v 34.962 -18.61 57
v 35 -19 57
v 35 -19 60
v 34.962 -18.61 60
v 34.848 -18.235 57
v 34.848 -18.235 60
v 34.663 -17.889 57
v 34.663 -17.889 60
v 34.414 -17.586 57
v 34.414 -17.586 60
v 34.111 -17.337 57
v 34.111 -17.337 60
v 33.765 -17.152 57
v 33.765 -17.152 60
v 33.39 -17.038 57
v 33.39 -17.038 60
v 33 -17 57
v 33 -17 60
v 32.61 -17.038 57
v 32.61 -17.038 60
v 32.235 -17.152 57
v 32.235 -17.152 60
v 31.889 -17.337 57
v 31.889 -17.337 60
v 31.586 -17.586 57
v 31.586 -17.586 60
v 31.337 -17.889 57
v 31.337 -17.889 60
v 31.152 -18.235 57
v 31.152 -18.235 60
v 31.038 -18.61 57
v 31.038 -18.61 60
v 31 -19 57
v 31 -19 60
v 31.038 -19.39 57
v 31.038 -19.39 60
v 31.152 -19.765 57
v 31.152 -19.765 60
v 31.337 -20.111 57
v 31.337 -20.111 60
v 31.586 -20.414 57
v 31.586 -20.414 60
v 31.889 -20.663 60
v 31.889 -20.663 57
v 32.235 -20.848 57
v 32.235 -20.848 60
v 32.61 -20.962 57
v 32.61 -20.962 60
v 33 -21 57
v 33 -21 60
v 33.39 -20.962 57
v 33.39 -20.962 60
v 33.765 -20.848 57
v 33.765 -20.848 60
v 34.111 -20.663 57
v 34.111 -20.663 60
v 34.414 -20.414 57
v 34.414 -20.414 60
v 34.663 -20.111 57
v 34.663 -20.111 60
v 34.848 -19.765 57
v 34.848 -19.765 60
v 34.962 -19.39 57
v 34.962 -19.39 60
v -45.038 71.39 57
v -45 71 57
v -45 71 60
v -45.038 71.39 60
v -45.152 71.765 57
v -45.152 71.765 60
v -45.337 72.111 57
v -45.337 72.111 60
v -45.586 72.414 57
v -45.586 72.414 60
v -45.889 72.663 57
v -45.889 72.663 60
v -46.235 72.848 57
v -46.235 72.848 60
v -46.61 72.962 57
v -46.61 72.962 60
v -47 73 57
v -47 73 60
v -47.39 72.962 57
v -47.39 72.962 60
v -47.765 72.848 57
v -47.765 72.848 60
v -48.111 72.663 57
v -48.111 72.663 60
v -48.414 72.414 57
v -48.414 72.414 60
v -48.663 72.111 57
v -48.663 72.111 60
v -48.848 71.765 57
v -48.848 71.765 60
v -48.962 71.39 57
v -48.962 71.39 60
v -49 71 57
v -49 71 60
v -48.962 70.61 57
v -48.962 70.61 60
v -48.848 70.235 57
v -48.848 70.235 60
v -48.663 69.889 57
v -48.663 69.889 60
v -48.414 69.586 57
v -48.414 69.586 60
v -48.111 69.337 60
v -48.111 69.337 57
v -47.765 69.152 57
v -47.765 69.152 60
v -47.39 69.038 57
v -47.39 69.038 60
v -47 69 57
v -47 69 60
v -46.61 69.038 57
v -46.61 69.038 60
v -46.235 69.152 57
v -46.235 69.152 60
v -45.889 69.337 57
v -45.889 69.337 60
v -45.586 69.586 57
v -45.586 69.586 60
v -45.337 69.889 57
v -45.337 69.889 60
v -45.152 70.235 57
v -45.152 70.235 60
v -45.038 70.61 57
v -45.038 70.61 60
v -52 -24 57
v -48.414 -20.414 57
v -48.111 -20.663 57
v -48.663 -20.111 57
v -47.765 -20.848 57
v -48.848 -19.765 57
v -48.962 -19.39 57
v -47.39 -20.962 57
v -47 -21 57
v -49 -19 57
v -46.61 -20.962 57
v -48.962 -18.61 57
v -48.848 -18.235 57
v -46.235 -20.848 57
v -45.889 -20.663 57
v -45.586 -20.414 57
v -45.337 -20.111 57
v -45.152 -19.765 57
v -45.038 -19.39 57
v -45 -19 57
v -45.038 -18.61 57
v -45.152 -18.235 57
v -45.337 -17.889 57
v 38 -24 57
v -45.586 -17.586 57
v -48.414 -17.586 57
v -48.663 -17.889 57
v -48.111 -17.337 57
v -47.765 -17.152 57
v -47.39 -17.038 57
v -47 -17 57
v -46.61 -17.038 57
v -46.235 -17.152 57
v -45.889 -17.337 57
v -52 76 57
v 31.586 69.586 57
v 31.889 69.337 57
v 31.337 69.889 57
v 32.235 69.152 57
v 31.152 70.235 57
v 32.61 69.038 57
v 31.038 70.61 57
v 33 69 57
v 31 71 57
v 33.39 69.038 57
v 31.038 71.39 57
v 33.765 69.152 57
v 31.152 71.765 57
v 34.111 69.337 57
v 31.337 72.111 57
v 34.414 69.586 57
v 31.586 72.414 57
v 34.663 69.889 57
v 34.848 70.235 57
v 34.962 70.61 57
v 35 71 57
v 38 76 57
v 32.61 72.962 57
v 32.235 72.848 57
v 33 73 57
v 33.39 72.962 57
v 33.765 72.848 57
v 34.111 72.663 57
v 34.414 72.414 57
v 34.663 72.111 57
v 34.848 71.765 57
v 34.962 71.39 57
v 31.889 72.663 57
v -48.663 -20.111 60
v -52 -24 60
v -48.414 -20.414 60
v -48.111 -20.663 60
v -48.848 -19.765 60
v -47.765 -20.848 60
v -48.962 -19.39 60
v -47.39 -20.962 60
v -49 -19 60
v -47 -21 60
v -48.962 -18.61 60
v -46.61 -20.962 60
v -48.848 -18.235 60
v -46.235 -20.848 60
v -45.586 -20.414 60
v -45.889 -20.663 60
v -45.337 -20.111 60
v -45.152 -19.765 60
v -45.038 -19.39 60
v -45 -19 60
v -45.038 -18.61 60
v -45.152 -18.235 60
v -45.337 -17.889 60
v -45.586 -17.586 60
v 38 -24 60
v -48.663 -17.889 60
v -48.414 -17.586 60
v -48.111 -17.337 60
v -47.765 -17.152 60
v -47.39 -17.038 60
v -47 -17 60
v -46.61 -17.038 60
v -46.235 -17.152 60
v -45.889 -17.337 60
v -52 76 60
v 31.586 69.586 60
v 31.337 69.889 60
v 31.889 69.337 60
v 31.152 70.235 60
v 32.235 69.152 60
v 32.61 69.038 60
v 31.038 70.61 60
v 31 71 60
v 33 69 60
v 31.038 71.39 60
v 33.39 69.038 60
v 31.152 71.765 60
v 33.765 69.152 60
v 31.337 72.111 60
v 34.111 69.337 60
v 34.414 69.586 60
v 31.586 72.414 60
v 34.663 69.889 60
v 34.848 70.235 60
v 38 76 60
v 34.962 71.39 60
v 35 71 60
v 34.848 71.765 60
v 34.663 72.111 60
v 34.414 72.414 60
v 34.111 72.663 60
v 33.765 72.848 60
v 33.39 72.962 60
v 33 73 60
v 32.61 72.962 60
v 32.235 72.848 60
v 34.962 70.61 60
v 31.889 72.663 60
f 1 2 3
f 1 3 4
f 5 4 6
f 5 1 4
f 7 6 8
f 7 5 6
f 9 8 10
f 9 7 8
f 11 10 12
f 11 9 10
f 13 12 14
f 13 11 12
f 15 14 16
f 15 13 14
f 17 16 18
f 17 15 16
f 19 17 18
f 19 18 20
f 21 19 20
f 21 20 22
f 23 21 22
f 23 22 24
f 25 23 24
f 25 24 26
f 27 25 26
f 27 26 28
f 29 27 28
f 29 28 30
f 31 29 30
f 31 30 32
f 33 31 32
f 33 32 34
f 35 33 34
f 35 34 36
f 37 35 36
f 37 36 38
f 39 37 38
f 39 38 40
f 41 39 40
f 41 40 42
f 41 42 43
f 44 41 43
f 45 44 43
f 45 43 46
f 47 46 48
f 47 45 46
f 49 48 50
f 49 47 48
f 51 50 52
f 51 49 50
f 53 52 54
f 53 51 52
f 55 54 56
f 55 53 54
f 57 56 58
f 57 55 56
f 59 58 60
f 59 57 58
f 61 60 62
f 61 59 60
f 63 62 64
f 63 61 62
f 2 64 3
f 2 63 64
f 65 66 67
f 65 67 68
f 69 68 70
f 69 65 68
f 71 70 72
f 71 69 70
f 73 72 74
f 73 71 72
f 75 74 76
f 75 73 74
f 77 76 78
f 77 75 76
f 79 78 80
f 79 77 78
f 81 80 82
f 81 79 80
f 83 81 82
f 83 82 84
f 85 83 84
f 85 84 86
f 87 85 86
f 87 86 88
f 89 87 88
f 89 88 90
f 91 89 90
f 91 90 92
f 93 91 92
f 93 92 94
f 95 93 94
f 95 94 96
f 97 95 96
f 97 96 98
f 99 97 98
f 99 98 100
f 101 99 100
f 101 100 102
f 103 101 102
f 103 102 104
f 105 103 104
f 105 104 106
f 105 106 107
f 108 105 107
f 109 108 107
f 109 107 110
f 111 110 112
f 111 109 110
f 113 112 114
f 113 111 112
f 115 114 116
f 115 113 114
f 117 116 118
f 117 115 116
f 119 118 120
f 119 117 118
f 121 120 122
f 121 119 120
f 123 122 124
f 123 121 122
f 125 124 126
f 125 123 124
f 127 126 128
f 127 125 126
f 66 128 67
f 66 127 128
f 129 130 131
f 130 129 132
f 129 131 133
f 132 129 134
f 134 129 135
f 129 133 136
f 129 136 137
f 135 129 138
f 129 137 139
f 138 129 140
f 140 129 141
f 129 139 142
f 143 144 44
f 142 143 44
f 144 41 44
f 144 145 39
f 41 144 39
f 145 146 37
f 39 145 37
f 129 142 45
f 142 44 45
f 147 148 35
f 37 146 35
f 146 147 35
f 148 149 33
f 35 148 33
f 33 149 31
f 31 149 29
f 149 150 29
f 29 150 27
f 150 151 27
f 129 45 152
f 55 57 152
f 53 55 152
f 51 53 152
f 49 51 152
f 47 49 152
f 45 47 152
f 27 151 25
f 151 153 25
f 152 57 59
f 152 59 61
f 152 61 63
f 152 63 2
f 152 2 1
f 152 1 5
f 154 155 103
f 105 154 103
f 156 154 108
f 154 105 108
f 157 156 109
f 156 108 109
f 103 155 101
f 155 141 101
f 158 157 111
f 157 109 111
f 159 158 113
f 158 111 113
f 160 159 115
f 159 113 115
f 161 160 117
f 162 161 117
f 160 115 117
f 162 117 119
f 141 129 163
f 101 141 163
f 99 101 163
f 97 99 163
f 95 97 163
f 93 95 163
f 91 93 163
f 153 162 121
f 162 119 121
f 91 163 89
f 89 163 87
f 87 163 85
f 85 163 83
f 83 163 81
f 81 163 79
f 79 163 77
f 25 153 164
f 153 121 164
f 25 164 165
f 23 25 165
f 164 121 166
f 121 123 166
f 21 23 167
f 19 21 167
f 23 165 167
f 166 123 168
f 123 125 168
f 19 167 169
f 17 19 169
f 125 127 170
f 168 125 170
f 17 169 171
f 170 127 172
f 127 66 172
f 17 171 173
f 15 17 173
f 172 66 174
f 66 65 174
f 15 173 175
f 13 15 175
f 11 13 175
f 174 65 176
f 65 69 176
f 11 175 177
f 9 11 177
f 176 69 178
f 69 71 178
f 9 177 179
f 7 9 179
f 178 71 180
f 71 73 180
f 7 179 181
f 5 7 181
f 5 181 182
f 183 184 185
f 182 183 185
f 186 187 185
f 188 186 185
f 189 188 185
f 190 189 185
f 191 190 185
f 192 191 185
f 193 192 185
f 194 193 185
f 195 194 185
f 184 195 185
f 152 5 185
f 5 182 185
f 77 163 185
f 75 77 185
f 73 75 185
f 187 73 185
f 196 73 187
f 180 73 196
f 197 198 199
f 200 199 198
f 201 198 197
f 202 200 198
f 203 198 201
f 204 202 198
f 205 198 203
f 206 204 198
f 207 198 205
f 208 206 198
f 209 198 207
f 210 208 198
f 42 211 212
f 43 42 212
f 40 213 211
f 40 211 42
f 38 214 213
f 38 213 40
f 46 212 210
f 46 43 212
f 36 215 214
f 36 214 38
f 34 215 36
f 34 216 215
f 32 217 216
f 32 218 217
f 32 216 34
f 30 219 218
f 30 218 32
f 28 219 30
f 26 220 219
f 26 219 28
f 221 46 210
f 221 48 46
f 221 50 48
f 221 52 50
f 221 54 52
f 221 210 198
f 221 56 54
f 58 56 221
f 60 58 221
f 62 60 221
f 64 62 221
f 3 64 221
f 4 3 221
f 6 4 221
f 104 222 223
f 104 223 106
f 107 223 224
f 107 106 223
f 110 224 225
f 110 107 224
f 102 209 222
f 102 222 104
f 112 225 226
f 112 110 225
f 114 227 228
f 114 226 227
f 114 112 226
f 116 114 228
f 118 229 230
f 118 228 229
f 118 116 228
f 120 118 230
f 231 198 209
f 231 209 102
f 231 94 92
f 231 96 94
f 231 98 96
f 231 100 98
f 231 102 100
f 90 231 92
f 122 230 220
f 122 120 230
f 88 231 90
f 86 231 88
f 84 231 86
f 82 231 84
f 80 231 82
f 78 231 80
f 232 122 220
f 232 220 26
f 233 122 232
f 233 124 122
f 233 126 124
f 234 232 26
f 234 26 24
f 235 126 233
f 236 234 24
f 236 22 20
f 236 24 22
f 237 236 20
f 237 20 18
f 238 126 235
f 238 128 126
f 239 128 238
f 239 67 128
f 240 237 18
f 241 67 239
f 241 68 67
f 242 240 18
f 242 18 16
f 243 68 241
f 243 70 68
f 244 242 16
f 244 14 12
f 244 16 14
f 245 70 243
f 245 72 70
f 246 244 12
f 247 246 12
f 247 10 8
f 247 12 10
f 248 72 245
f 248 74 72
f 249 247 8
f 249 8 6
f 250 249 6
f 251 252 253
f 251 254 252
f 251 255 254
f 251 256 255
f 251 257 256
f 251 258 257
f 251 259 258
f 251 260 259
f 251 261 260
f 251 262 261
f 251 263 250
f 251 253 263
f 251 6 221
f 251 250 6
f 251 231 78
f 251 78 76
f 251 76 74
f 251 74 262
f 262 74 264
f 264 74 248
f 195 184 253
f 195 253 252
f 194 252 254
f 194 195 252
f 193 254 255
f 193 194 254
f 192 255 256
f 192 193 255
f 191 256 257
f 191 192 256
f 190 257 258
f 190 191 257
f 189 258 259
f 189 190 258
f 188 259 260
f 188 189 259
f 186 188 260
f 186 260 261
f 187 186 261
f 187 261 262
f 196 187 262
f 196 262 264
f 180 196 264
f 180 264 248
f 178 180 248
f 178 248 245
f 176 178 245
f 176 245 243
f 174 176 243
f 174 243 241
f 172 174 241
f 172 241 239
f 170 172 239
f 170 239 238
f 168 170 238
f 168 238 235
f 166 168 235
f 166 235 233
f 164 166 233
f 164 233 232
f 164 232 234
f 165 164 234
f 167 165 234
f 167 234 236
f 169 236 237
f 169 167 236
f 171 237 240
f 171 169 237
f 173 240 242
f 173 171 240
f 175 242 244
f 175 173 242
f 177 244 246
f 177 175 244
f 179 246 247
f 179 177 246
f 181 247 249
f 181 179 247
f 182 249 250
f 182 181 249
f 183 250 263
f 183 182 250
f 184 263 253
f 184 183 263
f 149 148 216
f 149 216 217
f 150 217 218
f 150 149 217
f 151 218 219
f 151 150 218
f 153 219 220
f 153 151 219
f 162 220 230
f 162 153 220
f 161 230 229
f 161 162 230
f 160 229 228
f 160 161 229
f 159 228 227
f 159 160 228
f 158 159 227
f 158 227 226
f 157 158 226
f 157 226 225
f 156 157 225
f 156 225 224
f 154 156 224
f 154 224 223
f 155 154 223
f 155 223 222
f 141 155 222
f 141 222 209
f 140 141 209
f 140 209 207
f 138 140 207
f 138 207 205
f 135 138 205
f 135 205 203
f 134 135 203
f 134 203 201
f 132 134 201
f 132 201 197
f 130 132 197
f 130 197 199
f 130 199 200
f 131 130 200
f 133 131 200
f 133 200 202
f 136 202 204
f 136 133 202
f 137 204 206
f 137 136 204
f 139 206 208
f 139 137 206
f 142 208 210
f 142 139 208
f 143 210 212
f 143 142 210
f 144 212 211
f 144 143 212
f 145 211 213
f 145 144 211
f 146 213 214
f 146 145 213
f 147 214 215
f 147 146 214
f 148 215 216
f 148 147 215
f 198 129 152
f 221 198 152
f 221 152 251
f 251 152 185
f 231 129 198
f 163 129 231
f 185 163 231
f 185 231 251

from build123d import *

# Parameters (mm, degrees)
CYLINDER204_R     = 2
CYLINDER204_DEPTH = 13
CYLINDER205_R     = 2
CYLINDER205_DEPTH = 13
CYLINDER203_R     = 2
CYLINDER203_DEPTH = 13
CYLINDER206_R     = 2
CYLINDER206_DEPTH = 13
BOX259_W          = 90
BOX259_H          = 100
BOX259_DEPTH      = 3


with BuildPart() as cylinder204:
    # Cylinder204 → Cylinder204 (new body)
    with BuildSketch(Plane(origin=(33, 55, 32), x_dir=(1, 0, 0), z_dir=(0, 0, 1))):
        Circle(CYLINDER204_R)
    extrude(amount=CYLINDER204_DEPTH)


with BuildPart() as cylinder205:
    # Cylinder205 → Cylinder205 (new body)
    with BuildSketch(Plane(origin=(-47, 55, 32), x_dir=(1, 0, 0), z_dir=(0, 0, 1))):
        Circle(CYLINDER205_R)
    extrude(amount=CYLINDER205_DEPTH)


with BuildPart() as cylinder203:
    # Cylinder203 → Cylinder203 (new body)
    with BuildSketch(Plane(origin=(33, -35, 32), x_dir=(1, 0, 0), z_dir=(0, 0, 1))):
        Circle(CYLINDER203_R)
    extrude(amount=CYLINDER203_DEPTH)


with BuildPart() as cylinder206:
    # Cylinder206 → Cylinder206 (new body)
    with BuildSketch(Plane(origin=(-47, -35, 32), x_dir=(1, 0, 0), z_dir=(0, 0, 1))):
        Circle(CYLINDER206_R)
    extrude(amount=CYLINDER206_DEPTH)


with BuildPart() as cut171:
    # Box259 → Box259 (new body)
    with BuildSketch(Plane(origin=(-52, -40, 42), x_dir=(1, 0, 0), z_dir=(0, 0, 1))):
        with Locations((45, 50)):
            Rectangle(BOX259_W, BOX259_H)
    extrude(amount=BOX259_DEPTH)

    # Cut168: cut Cylinder206
    add(cylinder206.part, mode=Mode.SUBTRACT)

    # Cut169: cut Cylinder203
    add(cylinder203.part, mode=Mode.SUBTRACT)

    # Cut170: cut Cylinder205
    add(cylinder205.part, mode=Mode.SUBTRACT)

    # Cut171: cut Cylinder204
    add(cylinder204.part, mode=Mode.SUBTRACT)


with BuildPart() as cut171_1:
    # Cut171 placement: moved
    add(cut171.part.moved(Location((0, 16, 15))))


solid = cut171_1.part
